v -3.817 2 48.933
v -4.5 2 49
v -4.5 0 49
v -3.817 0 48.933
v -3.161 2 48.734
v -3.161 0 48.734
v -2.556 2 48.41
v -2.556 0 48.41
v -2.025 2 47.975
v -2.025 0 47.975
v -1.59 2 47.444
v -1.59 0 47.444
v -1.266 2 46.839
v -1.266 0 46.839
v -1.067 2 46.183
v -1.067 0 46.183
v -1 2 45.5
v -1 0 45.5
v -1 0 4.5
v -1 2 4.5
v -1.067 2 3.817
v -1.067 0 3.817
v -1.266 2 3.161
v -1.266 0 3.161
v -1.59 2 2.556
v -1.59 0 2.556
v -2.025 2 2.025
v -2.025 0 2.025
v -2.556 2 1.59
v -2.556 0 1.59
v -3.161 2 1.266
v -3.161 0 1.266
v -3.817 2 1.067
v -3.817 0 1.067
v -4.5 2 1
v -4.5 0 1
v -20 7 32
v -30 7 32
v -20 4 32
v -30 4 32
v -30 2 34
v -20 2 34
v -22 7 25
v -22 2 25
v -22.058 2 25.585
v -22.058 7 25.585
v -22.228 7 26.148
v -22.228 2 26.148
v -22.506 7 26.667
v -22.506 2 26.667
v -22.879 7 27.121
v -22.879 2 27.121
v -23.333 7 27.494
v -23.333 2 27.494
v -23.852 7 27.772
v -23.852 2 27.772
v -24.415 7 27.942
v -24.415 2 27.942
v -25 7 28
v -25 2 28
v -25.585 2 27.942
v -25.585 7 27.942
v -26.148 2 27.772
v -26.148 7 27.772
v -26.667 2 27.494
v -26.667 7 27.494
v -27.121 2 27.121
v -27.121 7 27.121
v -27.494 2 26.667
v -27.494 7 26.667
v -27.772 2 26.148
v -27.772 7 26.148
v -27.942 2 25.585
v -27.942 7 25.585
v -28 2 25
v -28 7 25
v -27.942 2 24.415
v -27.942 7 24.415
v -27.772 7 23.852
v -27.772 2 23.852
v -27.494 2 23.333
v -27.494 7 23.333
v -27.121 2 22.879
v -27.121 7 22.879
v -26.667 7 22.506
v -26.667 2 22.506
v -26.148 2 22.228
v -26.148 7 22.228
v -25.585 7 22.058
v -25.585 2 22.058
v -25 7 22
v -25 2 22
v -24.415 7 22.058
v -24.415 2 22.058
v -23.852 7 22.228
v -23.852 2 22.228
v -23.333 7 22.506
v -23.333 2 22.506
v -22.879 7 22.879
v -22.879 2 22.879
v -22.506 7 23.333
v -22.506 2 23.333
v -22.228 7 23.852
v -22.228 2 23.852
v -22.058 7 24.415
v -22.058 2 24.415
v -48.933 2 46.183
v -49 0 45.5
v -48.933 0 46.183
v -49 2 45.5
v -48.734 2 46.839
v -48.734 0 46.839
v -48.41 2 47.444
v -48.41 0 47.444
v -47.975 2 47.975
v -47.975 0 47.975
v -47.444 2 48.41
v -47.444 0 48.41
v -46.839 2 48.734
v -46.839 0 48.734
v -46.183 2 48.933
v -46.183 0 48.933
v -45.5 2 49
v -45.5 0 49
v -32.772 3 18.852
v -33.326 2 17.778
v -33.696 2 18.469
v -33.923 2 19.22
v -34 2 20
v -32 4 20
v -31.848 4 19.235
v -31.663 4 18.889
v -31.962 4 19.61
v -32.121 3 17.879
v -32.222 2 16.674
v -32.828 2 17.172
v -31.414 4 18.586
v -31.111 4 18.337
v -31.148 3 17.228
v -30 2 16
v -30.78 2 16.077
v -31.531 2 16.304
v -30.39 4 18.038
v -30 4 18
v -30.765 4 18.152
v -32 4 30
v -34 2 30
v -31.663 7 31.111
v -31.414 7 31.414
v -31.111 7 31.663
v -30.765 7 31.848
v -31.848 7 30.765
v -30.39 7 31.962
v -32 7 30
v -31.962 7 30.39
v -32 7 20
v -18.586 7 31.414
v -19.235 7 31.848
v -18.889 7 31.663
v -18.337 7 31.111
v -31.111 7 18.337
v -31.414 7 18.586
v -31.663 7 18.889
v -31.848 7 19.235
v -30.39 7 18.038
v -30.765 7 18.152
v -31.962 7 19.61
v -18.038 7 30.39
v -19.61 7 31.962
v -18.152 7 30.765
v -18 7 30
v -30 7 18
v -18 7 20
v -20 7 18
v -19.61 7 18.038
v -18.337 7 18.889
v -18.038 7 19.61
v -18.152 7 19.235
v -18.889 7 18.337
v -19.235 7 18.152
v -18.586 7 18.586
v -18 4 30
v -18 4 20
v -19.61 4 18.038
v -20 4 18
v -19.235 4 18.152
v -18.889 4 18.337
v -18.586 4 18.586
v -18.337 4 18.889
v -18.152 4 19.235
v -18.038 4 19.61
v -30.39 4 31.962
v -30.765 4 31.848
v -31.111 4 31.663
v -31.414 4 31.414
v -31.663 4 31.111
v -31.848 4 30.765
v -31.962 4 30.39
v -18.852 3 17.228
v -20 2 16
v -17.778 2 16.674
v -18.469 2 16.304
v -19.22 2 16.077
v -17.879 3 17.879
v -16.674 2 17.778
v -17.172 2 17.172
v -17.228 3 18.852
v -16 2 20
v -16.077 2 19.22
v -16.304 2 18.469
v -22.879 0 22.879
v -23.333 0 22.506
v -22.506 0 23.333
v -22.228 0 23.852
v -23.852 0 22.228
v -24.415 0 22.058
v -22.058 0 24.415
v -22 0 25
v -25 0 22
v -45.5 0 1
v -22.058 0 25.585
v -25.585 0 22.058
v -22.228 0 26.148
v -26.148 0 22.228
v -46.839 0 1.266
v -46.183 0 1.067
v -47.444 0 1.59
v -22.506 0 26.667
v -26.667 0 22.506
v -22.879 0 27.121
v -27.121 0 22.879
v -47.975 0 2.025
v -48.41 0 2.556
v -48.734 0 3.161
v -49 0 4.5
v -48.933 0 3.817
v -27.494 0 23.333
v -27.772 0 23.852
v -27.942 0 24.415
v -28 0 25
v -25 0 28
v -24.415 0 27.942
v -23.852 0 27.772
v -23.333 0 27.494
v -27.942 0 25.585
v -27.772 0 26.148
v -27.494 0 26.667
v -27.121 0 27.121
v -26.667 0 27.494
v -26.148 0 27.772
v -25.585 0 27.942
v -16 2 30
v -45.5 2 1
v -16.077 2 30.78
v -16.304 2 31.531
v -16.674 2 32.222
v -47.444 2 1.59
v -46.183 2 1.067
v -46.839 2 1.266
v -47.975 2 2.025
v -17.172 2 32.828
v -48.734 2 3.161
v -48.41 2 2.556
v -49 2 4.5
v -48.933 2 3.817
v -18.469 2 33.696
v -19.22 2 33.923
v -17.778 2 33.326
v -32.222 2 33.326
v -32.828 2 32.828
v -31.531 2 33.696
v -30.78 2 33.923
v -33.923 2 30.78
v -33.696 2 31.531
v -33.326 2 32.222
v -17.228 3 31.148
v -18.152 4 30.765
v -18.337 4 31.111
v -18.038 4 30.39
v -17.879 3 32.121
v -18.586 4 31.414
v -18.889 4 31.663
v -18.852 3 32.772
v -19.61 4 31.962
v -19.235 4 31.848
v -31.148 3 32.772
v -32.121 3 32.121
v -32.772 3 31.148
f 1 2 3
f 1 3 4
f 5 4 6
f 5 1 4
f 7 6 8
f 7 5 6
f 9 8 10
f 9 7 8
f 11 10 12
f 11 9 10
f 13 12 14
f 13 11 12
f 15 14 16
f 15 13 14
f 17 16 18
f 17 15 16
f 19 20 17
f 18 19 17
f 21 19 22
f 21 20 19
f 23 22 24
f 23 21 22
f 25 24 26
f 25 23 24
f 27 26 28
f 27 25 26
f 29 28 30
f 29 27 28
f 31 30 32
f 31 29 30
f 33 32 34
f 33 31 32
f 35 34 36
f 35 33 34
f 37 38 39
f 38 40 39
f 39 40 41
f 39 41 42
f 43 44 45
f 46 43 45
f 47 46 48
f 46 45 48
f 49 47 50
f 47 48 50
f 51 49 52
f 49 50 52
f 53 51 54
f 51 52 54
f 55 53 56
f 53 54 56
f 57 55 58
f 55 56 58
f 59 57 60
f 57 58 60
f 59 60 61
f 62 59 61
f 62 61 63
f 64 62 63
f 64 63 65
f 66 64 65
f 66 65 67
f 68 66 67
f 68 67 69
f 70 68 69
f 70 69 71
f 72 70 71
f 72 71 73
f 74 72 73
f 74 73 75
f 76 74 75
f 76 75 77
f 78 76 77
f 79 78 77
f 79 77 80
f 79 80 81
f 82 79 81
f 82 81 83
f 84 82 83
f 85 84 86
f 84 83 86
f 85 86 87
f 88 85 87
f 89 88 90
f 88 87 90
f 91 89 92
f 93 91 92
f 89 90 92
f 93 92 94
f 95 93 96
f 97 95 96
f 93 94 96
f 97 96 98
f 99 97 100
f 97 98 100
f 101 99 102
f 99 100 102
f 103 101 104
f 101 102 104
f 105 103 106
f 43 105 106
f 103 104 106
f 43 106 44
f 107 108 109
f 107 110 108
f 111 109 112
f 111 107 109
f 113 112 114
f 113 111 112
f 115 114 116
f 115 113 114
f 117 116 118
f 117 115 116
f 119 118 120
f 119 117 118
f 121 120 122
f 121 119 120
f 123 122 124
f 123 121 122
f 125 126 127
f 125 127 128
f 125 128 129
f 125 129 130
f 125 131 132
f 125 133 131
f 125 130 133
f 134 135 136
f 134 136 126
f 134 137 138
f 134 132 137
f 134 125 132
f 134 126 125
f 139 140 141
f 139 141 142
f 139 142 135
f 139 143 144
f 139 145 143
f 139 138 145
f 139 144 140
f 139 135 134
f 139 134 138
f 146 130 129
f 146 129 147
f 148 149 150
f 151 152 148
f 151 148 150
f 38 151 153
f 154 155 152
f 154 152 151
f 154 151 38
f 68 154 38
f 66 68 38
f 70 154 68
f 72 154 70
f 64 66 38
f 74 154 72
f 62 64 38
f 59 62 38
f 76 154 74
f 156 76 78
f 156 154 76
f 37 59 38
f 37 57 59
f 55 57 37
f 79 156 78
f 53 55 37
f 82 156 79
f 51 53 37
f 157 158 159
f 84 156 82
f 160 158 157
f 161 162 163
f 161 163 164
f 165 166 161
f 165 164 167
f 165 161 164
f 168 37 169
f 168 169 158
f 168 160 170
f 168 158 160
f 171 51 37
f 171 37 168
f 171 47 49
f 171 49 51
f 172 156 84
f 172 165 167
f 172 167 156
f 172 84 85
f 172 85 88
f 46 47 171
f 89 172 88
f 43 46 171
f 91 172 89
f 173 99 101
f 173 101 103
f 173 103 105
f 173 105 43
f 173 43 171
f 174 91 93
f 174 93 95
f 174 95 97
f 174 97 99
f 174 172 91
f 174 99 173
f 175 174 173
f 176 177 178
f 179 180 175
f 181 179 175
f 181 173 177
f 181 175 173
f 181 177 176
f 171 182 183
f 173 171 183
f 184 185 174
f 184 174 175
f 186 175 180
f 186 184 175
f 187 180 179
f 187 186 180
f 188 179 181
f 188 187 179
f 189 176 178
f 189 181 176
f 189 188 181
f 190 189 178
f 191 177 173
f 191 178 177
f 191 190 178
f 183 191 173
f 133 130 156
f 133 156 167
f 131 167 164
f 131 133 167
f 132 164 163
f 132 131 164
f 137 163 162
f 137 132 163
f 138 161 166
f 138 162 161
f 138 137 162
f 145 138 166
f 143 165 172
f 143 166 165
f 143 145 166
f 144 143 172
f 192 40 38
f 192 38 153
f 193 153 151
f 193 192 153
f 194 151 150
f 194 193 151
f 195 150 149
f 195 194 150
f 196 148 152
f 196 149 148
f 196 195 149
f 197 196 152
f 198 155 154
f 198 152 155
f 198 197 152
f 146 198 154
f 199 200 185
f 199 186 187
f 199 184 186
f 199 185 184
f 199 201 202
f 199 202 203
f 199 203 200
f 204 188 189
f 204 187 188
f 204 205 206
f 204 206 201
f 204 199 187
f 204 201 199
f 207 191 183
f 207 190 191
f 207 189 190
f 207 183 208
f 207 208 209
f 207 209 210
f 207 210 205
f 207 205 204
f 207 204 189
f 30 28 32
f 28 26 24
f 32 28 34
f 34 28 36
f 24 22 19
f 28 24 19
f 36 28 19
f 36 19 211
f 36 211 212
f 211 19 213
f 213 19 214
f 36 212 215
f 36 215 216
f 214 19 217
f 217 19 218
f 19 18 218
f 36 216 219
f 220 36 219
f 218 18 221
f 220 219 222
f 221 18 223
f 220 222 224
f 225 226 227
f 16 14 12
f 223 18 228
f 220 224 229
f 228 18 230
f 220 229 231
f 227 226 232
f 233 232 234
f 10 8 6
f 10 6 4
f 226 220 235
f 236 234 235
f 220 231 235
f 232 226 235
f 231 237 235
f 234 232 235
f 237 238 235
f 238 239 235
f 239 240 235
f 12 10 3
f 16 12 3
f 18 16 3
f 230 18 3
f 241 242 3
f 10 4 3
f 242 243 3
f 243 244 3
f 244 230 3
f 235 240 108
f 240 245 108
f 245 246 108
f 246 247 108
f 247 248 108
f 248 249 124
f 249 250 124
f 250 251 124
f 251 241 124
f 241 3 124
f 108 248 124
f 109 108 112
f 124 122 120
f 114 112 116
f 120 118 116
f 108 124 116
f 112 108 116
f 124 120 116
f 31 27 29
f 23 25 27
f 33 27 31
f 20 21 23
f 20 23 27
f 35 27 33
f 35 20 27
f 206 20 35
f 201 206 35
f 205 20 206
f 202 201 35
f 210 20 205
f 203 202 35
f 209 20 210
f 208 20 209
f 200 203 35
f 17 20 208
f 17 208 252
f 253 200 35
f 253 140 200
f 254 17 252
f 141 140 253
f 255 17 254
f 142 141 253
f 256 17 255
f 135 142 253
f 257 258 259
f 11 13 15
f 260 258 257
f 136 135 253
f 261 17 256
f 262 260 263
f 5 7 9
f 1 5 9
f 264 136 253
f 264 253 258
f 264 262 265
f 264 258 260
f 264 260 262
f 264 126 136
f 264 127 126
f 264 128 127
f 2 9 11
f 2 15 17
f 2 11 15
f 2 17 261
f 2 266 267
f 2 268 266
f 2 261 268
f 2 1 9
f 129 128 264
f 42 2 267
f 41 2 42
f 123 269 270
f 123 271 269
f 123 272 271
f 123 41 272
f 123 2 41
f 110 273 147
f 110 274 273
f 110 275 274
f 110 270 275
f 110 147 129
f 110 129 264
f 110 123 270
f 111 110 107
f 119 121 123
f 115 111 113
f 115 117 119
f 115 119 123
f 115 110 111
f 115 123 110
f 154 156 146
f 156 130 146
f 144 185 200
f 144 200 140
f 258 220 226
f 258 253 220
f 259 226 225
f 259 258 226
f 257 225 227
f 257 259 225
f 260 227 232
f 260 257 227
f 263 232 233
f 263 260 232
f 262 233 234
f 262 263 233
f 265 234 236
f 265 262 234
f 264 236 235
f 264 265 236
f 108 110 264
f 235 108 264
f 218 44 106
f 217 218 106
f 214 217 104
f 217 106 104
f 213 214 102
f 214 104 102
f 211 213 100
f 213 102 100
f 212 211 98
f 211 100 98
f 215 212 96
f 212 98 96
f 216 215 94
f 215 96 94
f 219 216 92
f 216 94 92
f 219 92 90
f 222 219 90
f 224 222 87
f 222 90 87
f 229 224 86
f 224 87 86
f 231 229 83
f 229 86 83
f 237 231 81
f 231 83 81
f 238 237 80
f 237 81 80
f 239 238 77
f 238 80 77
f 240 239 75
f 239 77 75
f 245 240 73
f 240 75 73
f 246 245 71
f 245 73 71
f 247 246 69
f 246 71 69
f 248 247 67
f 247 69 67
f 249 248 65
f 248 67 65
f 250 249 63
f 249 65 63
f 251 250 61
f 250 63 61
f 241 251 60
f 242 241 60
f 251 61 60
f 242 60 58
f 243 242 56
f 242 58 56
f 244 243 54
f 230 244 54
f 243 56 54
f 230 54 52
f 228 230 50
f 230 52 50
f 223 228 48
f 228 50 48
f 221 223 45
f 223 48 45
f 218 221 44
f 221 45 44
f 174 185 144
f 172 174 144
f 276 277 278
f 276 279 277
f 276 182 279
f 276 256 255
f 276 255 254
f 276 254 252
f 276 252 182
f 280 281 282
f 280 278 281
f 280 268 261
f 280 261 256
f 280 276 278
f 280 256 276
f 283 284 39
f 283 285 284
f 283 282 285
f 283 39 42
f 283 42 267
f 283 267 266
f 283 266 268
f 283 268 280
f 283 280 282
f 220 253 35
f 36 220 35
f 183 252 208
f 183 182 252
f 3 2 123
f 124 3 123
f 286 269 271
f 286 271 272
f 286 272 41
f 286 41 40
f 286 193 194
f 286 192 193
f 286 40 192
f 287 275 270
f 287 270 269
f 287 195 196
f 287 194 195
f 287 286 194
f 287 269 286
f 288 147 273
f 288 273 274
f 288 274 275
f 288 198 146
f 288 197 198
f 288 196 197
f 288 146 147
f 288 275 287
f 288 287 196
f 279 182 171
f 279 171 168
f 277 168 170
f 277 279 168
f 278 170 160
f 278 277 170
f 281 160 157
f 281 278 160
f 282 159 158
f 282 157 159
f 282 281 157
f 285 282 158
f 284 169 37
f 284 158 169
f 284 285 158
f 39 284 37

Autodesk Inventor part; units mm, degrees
ref_plane "YZ Plane" through (0, 0, 0) normal (1, 0, 0) x (0, 1, 0)
ref_plane "XZ Plane" through (0, 0, 0) normal (0, 1, 0) x (-1, 0, 0)
ref_plane "XY Plane" through (0, 0, 0) normal (0, 0, 1) x (1, 0, 0)
sketch "Эскиз1" plane through (0, 0, 0) normal (0, 1, 0) x (-1, 0, 0)
  line L0 (4.5, 0) -> (45.5, 0)
  line L1 (50, 4.5) -> (50, 45.5)
  line L2 (45.5, 50) -> (4.5, 50)
  line L3 (0, 45.5) -> (0, 4.5)
  arc A0 (50, 45.5) -> (45.5, 50) centre (45.5, 45.5) ccw
  arc A1 (45.5, 0) -> (50, 4.5) centre (45.5, 4.5) ccw
  arc A2 (4.5, 50) -> (0, 45.5) centre (4.5, 45.5) ccw
  arc A3 (0, 4.5) -> (4.5, 0) centre (4.5, 4.5) ccw
  point P0 (0, 0)
  point P1 (50, 50)
  point P2 (50, 0)
  point P3 (0, 50)
  dimension "d0" = 50
  dimension "d1" = 50
  dimension "d2" = 4.5
  dimension "d3" = 4.5
  dimension "d4" = 4.5
  dimension "d5" = 4.5
extrude "Выдавливание1" add sketch "Эскиз1" along normal blind 2
sketch "Эскиз2" plane through (0, 2, 0) normal (0, 1, 0) x (1, 0, 0)
  line L0 (-50, -4.5) -> (-50, -45.5) projected
  line L1 (-50, -25) -> (0, -25)
  line L2 (0, -45.5) -> (0, -4.5) projected
  circle A0 centre (-25, -25) radius 3
  arc A1 (-45.5, 0) -> (-50, -4.5) centre (-45.5, -4.5) ccw projected
  line L3 (-50, -4.5) -> (-50, -45.5) projected
  arc A2 (-50, -45.5) -> (-45.5, -50) centre (-45.5, -45.5) ccw projected
  line L4 (-45.5, -50) -> (-4.5, -50) projected
  arc A3 (-4.5, -50) -> (0, -45.5) centre (-4.5, -45.5) ccw projected
  line L5 (0, -45.5) -> (0, -4.5) projected
  arc A4 (0, -4.5) -> (-4.5, 0) centre (-4.5, -4.5) ccw projected
  line L6 (-4.5, 0) -> (-45.5, 0) projected
  line L7 (-30, -32) -> (-20, -32)
  line L8 (-18, -30) -> (-18, -20)
  line L9 (-20, -18) -> (-30, -18)
  line L10 (-32, -20) -> (-32, -30)
  line L11 (-32, -32) -> (-18, -18) construction
  line L12 (-18, -32) -> (-32, -18) construction
  arc A5 (-30, -18) -> (-32, -20) centre (-30, -20) ccw
  arc A6 (-32, -30) -> (-30, -32) centre (-30, -30) ccw
  arc A7 (-20, -32) -> (-18, -30) centre (-20, -30) ccw
  arc A8 (-18, -20) -> (-20, -18) centre (-20, -20) ccw
  point P0 (0, 0)
  dimension "d8" = 6
  dimension "d9" = 14
  dimension "d10" = 14
  dimension "d11" = 2
  dimension "d12" = 2
extrude "Выдавливание2" add sketch "Эскиз2" along normal blind 5 contours L10 A5 L9 A8 L8 L1 A0 | L1 A0 L8 A7 L7 A6 L10
chamfer "Фаска1" distance 2 angle 45 8 edges at (-25, 2, 32) (-31.4142, 2, 31.4142) (-32, 2, 25) (-31.4142, 2, 18.5858) (-25, 2, 18) (-18.5858, 2, 18.5858) (-18, 2, 25) (-18.5858, 2, 31.4142)
extrude "Выдавливание3" cut sketch "Эскиз2" against normal blind 5 contours A0 L1 | L1 A0
thread "Резьба1" size "M6x1" class "6H" standard "ANSI Metric M Profile" full length
sketch "Эскиз3" plane through (0, 2, 0) normal (0, 1, 0) x (1, 0, 0)
  arc A0 (-45.5, 0) -> (-50, -4.5) centre (-45.5, -4.5) ccw projected
  line L0 (-50, -4.5) -> (-50, -45.5) projected
  arc A1 (-50, -45.5) -> (-45.5, -50) centre (-45.5, -45.5) ccw projected
  line L1 (-45.5, -50) -> (-4.5, -50) projected
  arc A2 (-4.5, -50) -> (0, -45.5) centre (-4.5, -45.5) ccw projected
  line L2 (0, -45.5) -> (0, -4.5) projected
  arc A3 (0, -4.5) -> (-4.5, 0) centre (-4.5, -4.5) ccw projected
  line L3 (-4.5, 0) -> (-45.5, 0) projected
  line L4 (-30, -34) -> (-20, -34) projected
  arc A4 (-34, -30) -> (-30, -34) centre (-30, -30) ccw projected
  line L5 (-34, -20) -> (-34, -30) projected
  arc A5 (-30, -16) -> (-34, -20) centre (-30, -20) ccw projected
  line L6 (-20, -16) -> (-30, -16) projected
  arc A6 (-16, -20) -> (-20, -16) centre (-20, -20) ccw projected
  line L7 (-16, -30) -> (-16, -20) projected
  arc A7 (-20, -34) -> (-16, -30) centre (-20, -30) ccw projected
  line L8 (-1, -4.5) -> (-1, -45.5)
  arc A8 (-4.5, -49) -> (-1, -45.5) centre (-4.5, -45.5) ccw
  line L9 (-4.5, -49) -> (-45.5, -49)
  arc A9 (-49, -45.5) -> (-45.5, -49) centre (-45.5, -45.5) ccw
  line L10 (-49, -45.5) -> (-49, -4.5)
  arc A10 (-45.5, -1) -> (-49, -4.5) centre (-45.5, -4.5) ccw
  line L11 (-45.5, -1) -> (-4.5, -1)
  arc A11 (-1, -4.5) -> (-4.5, -1) centre (-4.5, -4.5) ccw
  point P0 (0, 0)
  dimension "d22" = 1
extrude "Выдавливание4" cut sketch "Эскиз3" against normal blind 10 contours L3 A3 L2 A2 L1 A1 L0 A0
properties part number "Bottom_contact" material "Сталь нержавеющая AISI 202"
